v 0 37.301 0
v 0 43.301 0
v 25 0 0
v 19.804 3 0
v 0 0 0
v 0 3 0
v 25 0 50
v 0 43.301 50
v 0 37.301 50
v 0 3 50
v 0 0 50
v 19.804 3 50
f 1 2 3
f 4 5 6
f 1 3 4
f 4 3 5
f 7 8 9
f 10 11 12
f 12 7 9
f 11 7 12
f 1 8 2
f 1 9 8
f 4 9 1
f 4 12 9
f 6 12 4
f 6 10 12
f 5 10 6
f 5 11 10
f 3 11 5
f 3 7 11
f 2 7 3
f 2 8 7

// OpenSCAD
// Parametric script for creating a printable ramp.

// The angle of the ramp.
theta = 30;

// How wide the ramp is.
width = 50;

// The minimum material thickness to use. The ramp will end up being a bit thicker at the points, but it will have this thickness on the walls.
thickness = 3.0;

// The length of the ramp.
ramp_length = 50;

// computed parameters
outer_triangle_height = sin(theta) * ramp_length;
outer_triangle_base = cos(theta) * ramp_length;
outer_triangle_hypot = ramp_length;

// even though the material width is x, you can't just add x all around if you want a smooth ramp lip
// the key is to realize that there's a right triangle you can draw that's similar to the main triangle
// and them from that you can draw another right triangle to fill in the space until the rectangular 
// wall begins
//
//    /|\   /
//   / | \ /
//  /  |  /
// / A | / A hollow interior

// the upper triangle has a leg of "wall thickness" and an angle of 180 - 90 - theta
// which lets us compute the upper triangle's hypotenuse
// sine(theta) = thickness/hypotenuse => hypotenuse = thickness/sine(theta)
upper_hypot = thickness/sin(90 - theta);

// upper_hypot is one leg of the bottom triangle. we can use tangent to find the base, which is the
// delta between the ramp lip and the interior
// tan(theta) = Opp/Adj => Adj = Opp/tan(theta)
lip_base = upper_hypot/tan(theta);

// for the upper corner, we have this
//     /|
//    / |
//   /  |
//  / /||
// / / ||

// can form a square of wall thickness on each side, but that leaves you a right triangle
// whose hypotenuse is the far wall of the ramp drop-off
// the inner tip of the triangle is thus offset that hypotenuse (vertical)
// and the the hypotenuse of the triangle formed by joining the top across to the side and using
// wall thickness as a leg

non_ramp_angle = 90 - theta; // because triangle is 180, and we know there's a 90 in lower right
y_offset_1 = thickness/sin(non_ramp_angle);

final_tip_angle = 180 - (90 + (90 - theta));
complementary_angle = 180 - final_tip_angle - 90;
y_offset_2 = thickness/tan(complementary_angle);


total_y_offset = y_offset_1 + y_offset_2;
x_offset = thickness/sin(complementary_angle);

// y offset = sine(90 - theta) = thickness/y_offset => thickness/sin(90-theta) = y_offset

inner_triangle_y_offset = thickness/sin(90 - theta);

// x_offset = cos(180 - 90 - theta
linear_extrude(height=width)
	polygon(points=[[0,0],
	  [outer_triangle_height,0],
	  [0,outer_triangle_base],
	  [0,outer_triangle_base - lip_base],
	  [outer_triangle_height - total_y_offset, thickness],
	  [0,thickness]]);
